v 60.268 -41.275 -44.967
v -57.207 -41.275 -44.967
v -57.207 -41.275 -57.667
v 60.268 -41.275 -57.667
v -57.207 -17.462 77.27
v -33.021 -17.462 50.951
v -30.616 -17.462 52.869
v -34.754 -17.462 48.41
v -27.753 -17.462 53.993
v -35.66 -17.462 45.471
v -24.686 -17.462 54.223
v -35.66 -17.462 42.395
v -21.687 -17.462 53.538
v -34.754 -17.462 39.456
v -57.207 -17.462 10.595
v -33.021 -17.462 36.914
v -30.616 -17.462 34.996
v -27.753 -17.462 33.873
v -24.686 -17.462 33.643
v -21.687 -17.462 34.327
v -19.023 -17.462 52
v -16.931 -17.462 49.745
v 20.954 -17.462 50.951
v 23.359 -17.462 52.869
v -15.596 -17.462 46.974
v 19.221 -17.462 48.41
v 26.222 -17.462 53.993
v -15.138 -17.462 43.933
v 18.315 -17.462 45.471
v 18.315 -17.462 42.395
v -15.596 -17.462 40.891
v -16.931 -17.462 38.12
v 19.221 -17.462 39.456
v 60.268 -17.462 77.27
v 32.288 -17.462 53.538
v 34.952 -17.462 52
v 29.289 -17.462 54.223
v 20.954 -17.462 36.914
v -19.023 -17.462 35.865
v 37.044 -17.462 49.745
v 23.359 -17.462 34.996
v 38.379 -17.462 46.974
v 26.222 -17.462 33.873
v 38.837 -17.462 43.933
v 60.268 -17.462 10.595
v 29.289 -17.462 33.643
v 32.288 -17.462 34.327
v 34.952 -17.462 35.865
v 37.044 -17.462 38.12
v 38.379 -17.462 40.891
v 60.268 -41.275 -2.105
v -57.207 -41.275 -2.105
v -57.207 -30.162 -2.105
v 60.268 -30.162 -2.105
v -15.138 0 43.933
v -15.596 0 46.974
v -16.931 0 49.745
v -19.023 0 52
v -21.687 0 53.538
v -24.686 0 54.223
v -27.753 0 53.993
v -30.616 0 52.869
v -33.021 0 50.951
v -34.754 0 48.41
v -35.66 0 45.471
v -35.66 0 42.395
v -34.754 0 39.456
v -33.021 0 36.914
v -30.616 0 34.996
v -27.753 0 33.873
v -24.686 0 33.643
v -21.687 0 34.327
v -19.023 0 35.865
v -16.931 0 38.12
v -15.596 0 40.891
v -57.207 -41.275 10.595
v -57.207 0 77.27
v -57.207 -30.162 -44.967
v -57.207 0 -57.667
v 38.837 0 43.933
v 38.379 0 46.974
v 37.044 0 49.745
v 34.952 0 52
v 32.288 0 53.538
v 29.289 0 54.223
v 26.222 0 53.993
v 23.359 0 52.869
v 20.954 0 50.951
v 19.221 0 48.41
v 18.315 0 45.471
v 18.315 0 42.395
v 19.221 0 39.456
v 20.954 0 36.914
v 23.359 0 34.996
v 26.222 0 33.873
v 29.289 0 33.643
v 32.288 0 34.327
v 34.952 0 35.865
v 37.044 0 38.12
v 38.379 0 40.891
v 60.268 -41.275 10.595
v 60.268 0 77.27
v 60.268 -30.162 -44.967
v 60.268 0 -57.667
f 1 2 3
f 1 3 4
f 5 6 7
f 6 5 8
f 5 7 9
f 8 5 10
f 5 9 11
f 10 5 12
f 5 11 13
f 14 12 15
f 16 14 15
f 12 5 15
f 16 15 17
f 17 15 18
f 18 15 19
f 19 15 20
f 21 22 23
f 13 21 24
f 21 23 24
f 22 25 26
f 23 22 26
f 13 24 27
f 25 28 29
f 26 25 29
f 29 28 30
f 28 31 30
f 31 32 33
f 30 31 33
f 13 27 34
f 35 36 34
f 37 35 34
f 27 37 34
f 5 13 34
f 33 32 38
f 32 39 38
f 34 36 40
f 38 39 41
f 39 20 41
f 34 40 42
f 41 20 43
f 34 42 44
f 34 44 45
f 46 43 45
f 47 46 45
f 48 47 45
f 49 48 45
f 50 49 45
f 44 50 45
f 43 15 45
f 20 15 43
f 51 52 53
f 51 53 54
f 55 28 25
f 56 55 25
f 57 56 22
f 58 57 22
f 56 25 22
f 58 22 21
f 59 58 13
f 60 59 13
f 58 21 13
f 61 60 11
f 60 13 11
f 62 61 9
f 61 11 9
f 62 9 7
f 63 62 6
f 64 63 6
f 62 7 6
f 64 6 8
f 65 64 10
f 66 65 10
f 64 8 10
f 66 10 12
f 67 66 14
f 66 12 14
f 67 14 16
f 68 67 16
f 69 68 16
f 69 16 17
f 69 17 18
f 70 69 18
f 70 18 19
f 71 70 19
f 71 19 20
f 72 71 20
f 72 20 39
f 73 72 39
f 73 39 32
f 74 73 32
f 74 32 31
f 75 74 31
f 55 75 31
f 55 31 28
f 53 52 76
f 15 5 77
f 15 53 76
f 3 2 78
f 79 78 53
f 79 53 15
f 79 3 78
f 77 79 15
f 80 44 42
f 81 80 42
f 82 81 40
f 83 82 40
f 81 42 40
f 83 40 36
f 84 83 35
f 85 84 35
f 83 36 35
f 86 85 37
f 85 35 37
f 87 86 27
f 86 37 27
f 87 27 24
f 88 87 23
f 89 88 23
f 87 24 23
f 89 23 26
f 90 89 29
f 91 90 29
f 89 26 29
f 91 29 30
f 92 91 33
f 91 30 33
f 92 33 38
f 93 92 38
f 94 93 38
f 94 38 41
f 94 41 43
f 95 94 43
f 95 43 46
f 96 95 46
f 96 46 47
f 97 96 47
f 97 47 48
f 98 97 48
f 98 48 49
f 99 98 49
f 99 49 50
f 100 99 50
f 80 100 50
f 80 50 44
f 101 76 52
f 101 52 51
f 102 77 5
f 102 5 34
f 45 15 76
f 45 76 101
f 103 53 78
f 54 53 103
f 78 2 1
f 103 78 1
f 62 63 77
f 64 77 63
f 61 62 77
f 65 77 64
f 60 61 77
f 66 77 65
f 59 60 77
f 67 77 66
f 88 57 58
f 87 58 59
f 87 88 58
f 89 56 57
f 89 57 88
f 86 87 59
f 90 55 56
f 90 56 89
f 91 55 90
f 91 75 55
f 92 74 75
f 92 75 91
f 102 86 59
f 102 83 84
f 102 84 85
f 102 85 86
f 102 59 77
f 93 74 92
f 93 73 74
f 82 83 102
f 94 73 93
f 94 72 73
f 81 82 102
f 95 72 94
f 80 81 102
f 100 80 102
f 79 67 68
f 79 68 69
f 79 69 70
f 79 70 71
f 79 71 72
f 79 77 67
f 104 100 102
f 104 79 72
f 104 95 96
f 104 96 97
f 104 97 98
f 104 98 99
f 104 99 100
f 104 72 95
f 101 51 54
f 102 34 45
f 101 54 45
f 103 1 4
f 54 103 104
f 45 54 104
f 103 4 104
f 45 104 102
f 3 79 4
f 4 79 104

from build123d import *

# Parameters (mm, degrees)
F0_W     = 117.475
F0_H     = 68.2625
F1_DEPTH = 41.275
F2_W     = 117.475
F2_H     = 42.8625
F3_DEPTH = 11.1125
F4_W     = 117.475
F4_H     = 17.4625
F5_DEPTH = 66.675
F6_R     = 10.31875
F7_DEPTH = 101.6


with BuildPart() as f1:
    # F0 (on Front) → F1 (new body)
    with BuildSketch(Plane.XZ):
        with Locations((1.530804, -23.5361)):
            Rectangle(F0_W, F0_H)
    extrude(amount=F1_DEPTH)

    # F2 (on face) → F3 (cut)
    with BuildSketch(Plane.XZ.offset(41.275)):
        with Locations((1.530804, -23.5361)):
            Rectangle(F2_W, F2_H)
    extrude(amount=-F3_DEPTH, mode=Mode.SUBTRACT)

    # F4 (on face) → F5 (join)
    with BuildSketch(Plane.XY.offset(10.59515)):
        with Locations((1.530804, -8.73125)):
            Rectangle(F4_W, F4_H)
    extrude(amount=F5_DEPTH)

    # F6 (on face) → F7 (cut)
    with BuildSketch(Plane.XZ.offset(17.4625)):
        with Locations((28.518304, 43.93265)):
            Circle(F6_R)
        with Locations((-25.456696, 43.93265)):
            Circle(F6_R)
    extrude(amount=-F7_DEPTH, mode=Mode.SUBTRACT)


solid = f1.part
